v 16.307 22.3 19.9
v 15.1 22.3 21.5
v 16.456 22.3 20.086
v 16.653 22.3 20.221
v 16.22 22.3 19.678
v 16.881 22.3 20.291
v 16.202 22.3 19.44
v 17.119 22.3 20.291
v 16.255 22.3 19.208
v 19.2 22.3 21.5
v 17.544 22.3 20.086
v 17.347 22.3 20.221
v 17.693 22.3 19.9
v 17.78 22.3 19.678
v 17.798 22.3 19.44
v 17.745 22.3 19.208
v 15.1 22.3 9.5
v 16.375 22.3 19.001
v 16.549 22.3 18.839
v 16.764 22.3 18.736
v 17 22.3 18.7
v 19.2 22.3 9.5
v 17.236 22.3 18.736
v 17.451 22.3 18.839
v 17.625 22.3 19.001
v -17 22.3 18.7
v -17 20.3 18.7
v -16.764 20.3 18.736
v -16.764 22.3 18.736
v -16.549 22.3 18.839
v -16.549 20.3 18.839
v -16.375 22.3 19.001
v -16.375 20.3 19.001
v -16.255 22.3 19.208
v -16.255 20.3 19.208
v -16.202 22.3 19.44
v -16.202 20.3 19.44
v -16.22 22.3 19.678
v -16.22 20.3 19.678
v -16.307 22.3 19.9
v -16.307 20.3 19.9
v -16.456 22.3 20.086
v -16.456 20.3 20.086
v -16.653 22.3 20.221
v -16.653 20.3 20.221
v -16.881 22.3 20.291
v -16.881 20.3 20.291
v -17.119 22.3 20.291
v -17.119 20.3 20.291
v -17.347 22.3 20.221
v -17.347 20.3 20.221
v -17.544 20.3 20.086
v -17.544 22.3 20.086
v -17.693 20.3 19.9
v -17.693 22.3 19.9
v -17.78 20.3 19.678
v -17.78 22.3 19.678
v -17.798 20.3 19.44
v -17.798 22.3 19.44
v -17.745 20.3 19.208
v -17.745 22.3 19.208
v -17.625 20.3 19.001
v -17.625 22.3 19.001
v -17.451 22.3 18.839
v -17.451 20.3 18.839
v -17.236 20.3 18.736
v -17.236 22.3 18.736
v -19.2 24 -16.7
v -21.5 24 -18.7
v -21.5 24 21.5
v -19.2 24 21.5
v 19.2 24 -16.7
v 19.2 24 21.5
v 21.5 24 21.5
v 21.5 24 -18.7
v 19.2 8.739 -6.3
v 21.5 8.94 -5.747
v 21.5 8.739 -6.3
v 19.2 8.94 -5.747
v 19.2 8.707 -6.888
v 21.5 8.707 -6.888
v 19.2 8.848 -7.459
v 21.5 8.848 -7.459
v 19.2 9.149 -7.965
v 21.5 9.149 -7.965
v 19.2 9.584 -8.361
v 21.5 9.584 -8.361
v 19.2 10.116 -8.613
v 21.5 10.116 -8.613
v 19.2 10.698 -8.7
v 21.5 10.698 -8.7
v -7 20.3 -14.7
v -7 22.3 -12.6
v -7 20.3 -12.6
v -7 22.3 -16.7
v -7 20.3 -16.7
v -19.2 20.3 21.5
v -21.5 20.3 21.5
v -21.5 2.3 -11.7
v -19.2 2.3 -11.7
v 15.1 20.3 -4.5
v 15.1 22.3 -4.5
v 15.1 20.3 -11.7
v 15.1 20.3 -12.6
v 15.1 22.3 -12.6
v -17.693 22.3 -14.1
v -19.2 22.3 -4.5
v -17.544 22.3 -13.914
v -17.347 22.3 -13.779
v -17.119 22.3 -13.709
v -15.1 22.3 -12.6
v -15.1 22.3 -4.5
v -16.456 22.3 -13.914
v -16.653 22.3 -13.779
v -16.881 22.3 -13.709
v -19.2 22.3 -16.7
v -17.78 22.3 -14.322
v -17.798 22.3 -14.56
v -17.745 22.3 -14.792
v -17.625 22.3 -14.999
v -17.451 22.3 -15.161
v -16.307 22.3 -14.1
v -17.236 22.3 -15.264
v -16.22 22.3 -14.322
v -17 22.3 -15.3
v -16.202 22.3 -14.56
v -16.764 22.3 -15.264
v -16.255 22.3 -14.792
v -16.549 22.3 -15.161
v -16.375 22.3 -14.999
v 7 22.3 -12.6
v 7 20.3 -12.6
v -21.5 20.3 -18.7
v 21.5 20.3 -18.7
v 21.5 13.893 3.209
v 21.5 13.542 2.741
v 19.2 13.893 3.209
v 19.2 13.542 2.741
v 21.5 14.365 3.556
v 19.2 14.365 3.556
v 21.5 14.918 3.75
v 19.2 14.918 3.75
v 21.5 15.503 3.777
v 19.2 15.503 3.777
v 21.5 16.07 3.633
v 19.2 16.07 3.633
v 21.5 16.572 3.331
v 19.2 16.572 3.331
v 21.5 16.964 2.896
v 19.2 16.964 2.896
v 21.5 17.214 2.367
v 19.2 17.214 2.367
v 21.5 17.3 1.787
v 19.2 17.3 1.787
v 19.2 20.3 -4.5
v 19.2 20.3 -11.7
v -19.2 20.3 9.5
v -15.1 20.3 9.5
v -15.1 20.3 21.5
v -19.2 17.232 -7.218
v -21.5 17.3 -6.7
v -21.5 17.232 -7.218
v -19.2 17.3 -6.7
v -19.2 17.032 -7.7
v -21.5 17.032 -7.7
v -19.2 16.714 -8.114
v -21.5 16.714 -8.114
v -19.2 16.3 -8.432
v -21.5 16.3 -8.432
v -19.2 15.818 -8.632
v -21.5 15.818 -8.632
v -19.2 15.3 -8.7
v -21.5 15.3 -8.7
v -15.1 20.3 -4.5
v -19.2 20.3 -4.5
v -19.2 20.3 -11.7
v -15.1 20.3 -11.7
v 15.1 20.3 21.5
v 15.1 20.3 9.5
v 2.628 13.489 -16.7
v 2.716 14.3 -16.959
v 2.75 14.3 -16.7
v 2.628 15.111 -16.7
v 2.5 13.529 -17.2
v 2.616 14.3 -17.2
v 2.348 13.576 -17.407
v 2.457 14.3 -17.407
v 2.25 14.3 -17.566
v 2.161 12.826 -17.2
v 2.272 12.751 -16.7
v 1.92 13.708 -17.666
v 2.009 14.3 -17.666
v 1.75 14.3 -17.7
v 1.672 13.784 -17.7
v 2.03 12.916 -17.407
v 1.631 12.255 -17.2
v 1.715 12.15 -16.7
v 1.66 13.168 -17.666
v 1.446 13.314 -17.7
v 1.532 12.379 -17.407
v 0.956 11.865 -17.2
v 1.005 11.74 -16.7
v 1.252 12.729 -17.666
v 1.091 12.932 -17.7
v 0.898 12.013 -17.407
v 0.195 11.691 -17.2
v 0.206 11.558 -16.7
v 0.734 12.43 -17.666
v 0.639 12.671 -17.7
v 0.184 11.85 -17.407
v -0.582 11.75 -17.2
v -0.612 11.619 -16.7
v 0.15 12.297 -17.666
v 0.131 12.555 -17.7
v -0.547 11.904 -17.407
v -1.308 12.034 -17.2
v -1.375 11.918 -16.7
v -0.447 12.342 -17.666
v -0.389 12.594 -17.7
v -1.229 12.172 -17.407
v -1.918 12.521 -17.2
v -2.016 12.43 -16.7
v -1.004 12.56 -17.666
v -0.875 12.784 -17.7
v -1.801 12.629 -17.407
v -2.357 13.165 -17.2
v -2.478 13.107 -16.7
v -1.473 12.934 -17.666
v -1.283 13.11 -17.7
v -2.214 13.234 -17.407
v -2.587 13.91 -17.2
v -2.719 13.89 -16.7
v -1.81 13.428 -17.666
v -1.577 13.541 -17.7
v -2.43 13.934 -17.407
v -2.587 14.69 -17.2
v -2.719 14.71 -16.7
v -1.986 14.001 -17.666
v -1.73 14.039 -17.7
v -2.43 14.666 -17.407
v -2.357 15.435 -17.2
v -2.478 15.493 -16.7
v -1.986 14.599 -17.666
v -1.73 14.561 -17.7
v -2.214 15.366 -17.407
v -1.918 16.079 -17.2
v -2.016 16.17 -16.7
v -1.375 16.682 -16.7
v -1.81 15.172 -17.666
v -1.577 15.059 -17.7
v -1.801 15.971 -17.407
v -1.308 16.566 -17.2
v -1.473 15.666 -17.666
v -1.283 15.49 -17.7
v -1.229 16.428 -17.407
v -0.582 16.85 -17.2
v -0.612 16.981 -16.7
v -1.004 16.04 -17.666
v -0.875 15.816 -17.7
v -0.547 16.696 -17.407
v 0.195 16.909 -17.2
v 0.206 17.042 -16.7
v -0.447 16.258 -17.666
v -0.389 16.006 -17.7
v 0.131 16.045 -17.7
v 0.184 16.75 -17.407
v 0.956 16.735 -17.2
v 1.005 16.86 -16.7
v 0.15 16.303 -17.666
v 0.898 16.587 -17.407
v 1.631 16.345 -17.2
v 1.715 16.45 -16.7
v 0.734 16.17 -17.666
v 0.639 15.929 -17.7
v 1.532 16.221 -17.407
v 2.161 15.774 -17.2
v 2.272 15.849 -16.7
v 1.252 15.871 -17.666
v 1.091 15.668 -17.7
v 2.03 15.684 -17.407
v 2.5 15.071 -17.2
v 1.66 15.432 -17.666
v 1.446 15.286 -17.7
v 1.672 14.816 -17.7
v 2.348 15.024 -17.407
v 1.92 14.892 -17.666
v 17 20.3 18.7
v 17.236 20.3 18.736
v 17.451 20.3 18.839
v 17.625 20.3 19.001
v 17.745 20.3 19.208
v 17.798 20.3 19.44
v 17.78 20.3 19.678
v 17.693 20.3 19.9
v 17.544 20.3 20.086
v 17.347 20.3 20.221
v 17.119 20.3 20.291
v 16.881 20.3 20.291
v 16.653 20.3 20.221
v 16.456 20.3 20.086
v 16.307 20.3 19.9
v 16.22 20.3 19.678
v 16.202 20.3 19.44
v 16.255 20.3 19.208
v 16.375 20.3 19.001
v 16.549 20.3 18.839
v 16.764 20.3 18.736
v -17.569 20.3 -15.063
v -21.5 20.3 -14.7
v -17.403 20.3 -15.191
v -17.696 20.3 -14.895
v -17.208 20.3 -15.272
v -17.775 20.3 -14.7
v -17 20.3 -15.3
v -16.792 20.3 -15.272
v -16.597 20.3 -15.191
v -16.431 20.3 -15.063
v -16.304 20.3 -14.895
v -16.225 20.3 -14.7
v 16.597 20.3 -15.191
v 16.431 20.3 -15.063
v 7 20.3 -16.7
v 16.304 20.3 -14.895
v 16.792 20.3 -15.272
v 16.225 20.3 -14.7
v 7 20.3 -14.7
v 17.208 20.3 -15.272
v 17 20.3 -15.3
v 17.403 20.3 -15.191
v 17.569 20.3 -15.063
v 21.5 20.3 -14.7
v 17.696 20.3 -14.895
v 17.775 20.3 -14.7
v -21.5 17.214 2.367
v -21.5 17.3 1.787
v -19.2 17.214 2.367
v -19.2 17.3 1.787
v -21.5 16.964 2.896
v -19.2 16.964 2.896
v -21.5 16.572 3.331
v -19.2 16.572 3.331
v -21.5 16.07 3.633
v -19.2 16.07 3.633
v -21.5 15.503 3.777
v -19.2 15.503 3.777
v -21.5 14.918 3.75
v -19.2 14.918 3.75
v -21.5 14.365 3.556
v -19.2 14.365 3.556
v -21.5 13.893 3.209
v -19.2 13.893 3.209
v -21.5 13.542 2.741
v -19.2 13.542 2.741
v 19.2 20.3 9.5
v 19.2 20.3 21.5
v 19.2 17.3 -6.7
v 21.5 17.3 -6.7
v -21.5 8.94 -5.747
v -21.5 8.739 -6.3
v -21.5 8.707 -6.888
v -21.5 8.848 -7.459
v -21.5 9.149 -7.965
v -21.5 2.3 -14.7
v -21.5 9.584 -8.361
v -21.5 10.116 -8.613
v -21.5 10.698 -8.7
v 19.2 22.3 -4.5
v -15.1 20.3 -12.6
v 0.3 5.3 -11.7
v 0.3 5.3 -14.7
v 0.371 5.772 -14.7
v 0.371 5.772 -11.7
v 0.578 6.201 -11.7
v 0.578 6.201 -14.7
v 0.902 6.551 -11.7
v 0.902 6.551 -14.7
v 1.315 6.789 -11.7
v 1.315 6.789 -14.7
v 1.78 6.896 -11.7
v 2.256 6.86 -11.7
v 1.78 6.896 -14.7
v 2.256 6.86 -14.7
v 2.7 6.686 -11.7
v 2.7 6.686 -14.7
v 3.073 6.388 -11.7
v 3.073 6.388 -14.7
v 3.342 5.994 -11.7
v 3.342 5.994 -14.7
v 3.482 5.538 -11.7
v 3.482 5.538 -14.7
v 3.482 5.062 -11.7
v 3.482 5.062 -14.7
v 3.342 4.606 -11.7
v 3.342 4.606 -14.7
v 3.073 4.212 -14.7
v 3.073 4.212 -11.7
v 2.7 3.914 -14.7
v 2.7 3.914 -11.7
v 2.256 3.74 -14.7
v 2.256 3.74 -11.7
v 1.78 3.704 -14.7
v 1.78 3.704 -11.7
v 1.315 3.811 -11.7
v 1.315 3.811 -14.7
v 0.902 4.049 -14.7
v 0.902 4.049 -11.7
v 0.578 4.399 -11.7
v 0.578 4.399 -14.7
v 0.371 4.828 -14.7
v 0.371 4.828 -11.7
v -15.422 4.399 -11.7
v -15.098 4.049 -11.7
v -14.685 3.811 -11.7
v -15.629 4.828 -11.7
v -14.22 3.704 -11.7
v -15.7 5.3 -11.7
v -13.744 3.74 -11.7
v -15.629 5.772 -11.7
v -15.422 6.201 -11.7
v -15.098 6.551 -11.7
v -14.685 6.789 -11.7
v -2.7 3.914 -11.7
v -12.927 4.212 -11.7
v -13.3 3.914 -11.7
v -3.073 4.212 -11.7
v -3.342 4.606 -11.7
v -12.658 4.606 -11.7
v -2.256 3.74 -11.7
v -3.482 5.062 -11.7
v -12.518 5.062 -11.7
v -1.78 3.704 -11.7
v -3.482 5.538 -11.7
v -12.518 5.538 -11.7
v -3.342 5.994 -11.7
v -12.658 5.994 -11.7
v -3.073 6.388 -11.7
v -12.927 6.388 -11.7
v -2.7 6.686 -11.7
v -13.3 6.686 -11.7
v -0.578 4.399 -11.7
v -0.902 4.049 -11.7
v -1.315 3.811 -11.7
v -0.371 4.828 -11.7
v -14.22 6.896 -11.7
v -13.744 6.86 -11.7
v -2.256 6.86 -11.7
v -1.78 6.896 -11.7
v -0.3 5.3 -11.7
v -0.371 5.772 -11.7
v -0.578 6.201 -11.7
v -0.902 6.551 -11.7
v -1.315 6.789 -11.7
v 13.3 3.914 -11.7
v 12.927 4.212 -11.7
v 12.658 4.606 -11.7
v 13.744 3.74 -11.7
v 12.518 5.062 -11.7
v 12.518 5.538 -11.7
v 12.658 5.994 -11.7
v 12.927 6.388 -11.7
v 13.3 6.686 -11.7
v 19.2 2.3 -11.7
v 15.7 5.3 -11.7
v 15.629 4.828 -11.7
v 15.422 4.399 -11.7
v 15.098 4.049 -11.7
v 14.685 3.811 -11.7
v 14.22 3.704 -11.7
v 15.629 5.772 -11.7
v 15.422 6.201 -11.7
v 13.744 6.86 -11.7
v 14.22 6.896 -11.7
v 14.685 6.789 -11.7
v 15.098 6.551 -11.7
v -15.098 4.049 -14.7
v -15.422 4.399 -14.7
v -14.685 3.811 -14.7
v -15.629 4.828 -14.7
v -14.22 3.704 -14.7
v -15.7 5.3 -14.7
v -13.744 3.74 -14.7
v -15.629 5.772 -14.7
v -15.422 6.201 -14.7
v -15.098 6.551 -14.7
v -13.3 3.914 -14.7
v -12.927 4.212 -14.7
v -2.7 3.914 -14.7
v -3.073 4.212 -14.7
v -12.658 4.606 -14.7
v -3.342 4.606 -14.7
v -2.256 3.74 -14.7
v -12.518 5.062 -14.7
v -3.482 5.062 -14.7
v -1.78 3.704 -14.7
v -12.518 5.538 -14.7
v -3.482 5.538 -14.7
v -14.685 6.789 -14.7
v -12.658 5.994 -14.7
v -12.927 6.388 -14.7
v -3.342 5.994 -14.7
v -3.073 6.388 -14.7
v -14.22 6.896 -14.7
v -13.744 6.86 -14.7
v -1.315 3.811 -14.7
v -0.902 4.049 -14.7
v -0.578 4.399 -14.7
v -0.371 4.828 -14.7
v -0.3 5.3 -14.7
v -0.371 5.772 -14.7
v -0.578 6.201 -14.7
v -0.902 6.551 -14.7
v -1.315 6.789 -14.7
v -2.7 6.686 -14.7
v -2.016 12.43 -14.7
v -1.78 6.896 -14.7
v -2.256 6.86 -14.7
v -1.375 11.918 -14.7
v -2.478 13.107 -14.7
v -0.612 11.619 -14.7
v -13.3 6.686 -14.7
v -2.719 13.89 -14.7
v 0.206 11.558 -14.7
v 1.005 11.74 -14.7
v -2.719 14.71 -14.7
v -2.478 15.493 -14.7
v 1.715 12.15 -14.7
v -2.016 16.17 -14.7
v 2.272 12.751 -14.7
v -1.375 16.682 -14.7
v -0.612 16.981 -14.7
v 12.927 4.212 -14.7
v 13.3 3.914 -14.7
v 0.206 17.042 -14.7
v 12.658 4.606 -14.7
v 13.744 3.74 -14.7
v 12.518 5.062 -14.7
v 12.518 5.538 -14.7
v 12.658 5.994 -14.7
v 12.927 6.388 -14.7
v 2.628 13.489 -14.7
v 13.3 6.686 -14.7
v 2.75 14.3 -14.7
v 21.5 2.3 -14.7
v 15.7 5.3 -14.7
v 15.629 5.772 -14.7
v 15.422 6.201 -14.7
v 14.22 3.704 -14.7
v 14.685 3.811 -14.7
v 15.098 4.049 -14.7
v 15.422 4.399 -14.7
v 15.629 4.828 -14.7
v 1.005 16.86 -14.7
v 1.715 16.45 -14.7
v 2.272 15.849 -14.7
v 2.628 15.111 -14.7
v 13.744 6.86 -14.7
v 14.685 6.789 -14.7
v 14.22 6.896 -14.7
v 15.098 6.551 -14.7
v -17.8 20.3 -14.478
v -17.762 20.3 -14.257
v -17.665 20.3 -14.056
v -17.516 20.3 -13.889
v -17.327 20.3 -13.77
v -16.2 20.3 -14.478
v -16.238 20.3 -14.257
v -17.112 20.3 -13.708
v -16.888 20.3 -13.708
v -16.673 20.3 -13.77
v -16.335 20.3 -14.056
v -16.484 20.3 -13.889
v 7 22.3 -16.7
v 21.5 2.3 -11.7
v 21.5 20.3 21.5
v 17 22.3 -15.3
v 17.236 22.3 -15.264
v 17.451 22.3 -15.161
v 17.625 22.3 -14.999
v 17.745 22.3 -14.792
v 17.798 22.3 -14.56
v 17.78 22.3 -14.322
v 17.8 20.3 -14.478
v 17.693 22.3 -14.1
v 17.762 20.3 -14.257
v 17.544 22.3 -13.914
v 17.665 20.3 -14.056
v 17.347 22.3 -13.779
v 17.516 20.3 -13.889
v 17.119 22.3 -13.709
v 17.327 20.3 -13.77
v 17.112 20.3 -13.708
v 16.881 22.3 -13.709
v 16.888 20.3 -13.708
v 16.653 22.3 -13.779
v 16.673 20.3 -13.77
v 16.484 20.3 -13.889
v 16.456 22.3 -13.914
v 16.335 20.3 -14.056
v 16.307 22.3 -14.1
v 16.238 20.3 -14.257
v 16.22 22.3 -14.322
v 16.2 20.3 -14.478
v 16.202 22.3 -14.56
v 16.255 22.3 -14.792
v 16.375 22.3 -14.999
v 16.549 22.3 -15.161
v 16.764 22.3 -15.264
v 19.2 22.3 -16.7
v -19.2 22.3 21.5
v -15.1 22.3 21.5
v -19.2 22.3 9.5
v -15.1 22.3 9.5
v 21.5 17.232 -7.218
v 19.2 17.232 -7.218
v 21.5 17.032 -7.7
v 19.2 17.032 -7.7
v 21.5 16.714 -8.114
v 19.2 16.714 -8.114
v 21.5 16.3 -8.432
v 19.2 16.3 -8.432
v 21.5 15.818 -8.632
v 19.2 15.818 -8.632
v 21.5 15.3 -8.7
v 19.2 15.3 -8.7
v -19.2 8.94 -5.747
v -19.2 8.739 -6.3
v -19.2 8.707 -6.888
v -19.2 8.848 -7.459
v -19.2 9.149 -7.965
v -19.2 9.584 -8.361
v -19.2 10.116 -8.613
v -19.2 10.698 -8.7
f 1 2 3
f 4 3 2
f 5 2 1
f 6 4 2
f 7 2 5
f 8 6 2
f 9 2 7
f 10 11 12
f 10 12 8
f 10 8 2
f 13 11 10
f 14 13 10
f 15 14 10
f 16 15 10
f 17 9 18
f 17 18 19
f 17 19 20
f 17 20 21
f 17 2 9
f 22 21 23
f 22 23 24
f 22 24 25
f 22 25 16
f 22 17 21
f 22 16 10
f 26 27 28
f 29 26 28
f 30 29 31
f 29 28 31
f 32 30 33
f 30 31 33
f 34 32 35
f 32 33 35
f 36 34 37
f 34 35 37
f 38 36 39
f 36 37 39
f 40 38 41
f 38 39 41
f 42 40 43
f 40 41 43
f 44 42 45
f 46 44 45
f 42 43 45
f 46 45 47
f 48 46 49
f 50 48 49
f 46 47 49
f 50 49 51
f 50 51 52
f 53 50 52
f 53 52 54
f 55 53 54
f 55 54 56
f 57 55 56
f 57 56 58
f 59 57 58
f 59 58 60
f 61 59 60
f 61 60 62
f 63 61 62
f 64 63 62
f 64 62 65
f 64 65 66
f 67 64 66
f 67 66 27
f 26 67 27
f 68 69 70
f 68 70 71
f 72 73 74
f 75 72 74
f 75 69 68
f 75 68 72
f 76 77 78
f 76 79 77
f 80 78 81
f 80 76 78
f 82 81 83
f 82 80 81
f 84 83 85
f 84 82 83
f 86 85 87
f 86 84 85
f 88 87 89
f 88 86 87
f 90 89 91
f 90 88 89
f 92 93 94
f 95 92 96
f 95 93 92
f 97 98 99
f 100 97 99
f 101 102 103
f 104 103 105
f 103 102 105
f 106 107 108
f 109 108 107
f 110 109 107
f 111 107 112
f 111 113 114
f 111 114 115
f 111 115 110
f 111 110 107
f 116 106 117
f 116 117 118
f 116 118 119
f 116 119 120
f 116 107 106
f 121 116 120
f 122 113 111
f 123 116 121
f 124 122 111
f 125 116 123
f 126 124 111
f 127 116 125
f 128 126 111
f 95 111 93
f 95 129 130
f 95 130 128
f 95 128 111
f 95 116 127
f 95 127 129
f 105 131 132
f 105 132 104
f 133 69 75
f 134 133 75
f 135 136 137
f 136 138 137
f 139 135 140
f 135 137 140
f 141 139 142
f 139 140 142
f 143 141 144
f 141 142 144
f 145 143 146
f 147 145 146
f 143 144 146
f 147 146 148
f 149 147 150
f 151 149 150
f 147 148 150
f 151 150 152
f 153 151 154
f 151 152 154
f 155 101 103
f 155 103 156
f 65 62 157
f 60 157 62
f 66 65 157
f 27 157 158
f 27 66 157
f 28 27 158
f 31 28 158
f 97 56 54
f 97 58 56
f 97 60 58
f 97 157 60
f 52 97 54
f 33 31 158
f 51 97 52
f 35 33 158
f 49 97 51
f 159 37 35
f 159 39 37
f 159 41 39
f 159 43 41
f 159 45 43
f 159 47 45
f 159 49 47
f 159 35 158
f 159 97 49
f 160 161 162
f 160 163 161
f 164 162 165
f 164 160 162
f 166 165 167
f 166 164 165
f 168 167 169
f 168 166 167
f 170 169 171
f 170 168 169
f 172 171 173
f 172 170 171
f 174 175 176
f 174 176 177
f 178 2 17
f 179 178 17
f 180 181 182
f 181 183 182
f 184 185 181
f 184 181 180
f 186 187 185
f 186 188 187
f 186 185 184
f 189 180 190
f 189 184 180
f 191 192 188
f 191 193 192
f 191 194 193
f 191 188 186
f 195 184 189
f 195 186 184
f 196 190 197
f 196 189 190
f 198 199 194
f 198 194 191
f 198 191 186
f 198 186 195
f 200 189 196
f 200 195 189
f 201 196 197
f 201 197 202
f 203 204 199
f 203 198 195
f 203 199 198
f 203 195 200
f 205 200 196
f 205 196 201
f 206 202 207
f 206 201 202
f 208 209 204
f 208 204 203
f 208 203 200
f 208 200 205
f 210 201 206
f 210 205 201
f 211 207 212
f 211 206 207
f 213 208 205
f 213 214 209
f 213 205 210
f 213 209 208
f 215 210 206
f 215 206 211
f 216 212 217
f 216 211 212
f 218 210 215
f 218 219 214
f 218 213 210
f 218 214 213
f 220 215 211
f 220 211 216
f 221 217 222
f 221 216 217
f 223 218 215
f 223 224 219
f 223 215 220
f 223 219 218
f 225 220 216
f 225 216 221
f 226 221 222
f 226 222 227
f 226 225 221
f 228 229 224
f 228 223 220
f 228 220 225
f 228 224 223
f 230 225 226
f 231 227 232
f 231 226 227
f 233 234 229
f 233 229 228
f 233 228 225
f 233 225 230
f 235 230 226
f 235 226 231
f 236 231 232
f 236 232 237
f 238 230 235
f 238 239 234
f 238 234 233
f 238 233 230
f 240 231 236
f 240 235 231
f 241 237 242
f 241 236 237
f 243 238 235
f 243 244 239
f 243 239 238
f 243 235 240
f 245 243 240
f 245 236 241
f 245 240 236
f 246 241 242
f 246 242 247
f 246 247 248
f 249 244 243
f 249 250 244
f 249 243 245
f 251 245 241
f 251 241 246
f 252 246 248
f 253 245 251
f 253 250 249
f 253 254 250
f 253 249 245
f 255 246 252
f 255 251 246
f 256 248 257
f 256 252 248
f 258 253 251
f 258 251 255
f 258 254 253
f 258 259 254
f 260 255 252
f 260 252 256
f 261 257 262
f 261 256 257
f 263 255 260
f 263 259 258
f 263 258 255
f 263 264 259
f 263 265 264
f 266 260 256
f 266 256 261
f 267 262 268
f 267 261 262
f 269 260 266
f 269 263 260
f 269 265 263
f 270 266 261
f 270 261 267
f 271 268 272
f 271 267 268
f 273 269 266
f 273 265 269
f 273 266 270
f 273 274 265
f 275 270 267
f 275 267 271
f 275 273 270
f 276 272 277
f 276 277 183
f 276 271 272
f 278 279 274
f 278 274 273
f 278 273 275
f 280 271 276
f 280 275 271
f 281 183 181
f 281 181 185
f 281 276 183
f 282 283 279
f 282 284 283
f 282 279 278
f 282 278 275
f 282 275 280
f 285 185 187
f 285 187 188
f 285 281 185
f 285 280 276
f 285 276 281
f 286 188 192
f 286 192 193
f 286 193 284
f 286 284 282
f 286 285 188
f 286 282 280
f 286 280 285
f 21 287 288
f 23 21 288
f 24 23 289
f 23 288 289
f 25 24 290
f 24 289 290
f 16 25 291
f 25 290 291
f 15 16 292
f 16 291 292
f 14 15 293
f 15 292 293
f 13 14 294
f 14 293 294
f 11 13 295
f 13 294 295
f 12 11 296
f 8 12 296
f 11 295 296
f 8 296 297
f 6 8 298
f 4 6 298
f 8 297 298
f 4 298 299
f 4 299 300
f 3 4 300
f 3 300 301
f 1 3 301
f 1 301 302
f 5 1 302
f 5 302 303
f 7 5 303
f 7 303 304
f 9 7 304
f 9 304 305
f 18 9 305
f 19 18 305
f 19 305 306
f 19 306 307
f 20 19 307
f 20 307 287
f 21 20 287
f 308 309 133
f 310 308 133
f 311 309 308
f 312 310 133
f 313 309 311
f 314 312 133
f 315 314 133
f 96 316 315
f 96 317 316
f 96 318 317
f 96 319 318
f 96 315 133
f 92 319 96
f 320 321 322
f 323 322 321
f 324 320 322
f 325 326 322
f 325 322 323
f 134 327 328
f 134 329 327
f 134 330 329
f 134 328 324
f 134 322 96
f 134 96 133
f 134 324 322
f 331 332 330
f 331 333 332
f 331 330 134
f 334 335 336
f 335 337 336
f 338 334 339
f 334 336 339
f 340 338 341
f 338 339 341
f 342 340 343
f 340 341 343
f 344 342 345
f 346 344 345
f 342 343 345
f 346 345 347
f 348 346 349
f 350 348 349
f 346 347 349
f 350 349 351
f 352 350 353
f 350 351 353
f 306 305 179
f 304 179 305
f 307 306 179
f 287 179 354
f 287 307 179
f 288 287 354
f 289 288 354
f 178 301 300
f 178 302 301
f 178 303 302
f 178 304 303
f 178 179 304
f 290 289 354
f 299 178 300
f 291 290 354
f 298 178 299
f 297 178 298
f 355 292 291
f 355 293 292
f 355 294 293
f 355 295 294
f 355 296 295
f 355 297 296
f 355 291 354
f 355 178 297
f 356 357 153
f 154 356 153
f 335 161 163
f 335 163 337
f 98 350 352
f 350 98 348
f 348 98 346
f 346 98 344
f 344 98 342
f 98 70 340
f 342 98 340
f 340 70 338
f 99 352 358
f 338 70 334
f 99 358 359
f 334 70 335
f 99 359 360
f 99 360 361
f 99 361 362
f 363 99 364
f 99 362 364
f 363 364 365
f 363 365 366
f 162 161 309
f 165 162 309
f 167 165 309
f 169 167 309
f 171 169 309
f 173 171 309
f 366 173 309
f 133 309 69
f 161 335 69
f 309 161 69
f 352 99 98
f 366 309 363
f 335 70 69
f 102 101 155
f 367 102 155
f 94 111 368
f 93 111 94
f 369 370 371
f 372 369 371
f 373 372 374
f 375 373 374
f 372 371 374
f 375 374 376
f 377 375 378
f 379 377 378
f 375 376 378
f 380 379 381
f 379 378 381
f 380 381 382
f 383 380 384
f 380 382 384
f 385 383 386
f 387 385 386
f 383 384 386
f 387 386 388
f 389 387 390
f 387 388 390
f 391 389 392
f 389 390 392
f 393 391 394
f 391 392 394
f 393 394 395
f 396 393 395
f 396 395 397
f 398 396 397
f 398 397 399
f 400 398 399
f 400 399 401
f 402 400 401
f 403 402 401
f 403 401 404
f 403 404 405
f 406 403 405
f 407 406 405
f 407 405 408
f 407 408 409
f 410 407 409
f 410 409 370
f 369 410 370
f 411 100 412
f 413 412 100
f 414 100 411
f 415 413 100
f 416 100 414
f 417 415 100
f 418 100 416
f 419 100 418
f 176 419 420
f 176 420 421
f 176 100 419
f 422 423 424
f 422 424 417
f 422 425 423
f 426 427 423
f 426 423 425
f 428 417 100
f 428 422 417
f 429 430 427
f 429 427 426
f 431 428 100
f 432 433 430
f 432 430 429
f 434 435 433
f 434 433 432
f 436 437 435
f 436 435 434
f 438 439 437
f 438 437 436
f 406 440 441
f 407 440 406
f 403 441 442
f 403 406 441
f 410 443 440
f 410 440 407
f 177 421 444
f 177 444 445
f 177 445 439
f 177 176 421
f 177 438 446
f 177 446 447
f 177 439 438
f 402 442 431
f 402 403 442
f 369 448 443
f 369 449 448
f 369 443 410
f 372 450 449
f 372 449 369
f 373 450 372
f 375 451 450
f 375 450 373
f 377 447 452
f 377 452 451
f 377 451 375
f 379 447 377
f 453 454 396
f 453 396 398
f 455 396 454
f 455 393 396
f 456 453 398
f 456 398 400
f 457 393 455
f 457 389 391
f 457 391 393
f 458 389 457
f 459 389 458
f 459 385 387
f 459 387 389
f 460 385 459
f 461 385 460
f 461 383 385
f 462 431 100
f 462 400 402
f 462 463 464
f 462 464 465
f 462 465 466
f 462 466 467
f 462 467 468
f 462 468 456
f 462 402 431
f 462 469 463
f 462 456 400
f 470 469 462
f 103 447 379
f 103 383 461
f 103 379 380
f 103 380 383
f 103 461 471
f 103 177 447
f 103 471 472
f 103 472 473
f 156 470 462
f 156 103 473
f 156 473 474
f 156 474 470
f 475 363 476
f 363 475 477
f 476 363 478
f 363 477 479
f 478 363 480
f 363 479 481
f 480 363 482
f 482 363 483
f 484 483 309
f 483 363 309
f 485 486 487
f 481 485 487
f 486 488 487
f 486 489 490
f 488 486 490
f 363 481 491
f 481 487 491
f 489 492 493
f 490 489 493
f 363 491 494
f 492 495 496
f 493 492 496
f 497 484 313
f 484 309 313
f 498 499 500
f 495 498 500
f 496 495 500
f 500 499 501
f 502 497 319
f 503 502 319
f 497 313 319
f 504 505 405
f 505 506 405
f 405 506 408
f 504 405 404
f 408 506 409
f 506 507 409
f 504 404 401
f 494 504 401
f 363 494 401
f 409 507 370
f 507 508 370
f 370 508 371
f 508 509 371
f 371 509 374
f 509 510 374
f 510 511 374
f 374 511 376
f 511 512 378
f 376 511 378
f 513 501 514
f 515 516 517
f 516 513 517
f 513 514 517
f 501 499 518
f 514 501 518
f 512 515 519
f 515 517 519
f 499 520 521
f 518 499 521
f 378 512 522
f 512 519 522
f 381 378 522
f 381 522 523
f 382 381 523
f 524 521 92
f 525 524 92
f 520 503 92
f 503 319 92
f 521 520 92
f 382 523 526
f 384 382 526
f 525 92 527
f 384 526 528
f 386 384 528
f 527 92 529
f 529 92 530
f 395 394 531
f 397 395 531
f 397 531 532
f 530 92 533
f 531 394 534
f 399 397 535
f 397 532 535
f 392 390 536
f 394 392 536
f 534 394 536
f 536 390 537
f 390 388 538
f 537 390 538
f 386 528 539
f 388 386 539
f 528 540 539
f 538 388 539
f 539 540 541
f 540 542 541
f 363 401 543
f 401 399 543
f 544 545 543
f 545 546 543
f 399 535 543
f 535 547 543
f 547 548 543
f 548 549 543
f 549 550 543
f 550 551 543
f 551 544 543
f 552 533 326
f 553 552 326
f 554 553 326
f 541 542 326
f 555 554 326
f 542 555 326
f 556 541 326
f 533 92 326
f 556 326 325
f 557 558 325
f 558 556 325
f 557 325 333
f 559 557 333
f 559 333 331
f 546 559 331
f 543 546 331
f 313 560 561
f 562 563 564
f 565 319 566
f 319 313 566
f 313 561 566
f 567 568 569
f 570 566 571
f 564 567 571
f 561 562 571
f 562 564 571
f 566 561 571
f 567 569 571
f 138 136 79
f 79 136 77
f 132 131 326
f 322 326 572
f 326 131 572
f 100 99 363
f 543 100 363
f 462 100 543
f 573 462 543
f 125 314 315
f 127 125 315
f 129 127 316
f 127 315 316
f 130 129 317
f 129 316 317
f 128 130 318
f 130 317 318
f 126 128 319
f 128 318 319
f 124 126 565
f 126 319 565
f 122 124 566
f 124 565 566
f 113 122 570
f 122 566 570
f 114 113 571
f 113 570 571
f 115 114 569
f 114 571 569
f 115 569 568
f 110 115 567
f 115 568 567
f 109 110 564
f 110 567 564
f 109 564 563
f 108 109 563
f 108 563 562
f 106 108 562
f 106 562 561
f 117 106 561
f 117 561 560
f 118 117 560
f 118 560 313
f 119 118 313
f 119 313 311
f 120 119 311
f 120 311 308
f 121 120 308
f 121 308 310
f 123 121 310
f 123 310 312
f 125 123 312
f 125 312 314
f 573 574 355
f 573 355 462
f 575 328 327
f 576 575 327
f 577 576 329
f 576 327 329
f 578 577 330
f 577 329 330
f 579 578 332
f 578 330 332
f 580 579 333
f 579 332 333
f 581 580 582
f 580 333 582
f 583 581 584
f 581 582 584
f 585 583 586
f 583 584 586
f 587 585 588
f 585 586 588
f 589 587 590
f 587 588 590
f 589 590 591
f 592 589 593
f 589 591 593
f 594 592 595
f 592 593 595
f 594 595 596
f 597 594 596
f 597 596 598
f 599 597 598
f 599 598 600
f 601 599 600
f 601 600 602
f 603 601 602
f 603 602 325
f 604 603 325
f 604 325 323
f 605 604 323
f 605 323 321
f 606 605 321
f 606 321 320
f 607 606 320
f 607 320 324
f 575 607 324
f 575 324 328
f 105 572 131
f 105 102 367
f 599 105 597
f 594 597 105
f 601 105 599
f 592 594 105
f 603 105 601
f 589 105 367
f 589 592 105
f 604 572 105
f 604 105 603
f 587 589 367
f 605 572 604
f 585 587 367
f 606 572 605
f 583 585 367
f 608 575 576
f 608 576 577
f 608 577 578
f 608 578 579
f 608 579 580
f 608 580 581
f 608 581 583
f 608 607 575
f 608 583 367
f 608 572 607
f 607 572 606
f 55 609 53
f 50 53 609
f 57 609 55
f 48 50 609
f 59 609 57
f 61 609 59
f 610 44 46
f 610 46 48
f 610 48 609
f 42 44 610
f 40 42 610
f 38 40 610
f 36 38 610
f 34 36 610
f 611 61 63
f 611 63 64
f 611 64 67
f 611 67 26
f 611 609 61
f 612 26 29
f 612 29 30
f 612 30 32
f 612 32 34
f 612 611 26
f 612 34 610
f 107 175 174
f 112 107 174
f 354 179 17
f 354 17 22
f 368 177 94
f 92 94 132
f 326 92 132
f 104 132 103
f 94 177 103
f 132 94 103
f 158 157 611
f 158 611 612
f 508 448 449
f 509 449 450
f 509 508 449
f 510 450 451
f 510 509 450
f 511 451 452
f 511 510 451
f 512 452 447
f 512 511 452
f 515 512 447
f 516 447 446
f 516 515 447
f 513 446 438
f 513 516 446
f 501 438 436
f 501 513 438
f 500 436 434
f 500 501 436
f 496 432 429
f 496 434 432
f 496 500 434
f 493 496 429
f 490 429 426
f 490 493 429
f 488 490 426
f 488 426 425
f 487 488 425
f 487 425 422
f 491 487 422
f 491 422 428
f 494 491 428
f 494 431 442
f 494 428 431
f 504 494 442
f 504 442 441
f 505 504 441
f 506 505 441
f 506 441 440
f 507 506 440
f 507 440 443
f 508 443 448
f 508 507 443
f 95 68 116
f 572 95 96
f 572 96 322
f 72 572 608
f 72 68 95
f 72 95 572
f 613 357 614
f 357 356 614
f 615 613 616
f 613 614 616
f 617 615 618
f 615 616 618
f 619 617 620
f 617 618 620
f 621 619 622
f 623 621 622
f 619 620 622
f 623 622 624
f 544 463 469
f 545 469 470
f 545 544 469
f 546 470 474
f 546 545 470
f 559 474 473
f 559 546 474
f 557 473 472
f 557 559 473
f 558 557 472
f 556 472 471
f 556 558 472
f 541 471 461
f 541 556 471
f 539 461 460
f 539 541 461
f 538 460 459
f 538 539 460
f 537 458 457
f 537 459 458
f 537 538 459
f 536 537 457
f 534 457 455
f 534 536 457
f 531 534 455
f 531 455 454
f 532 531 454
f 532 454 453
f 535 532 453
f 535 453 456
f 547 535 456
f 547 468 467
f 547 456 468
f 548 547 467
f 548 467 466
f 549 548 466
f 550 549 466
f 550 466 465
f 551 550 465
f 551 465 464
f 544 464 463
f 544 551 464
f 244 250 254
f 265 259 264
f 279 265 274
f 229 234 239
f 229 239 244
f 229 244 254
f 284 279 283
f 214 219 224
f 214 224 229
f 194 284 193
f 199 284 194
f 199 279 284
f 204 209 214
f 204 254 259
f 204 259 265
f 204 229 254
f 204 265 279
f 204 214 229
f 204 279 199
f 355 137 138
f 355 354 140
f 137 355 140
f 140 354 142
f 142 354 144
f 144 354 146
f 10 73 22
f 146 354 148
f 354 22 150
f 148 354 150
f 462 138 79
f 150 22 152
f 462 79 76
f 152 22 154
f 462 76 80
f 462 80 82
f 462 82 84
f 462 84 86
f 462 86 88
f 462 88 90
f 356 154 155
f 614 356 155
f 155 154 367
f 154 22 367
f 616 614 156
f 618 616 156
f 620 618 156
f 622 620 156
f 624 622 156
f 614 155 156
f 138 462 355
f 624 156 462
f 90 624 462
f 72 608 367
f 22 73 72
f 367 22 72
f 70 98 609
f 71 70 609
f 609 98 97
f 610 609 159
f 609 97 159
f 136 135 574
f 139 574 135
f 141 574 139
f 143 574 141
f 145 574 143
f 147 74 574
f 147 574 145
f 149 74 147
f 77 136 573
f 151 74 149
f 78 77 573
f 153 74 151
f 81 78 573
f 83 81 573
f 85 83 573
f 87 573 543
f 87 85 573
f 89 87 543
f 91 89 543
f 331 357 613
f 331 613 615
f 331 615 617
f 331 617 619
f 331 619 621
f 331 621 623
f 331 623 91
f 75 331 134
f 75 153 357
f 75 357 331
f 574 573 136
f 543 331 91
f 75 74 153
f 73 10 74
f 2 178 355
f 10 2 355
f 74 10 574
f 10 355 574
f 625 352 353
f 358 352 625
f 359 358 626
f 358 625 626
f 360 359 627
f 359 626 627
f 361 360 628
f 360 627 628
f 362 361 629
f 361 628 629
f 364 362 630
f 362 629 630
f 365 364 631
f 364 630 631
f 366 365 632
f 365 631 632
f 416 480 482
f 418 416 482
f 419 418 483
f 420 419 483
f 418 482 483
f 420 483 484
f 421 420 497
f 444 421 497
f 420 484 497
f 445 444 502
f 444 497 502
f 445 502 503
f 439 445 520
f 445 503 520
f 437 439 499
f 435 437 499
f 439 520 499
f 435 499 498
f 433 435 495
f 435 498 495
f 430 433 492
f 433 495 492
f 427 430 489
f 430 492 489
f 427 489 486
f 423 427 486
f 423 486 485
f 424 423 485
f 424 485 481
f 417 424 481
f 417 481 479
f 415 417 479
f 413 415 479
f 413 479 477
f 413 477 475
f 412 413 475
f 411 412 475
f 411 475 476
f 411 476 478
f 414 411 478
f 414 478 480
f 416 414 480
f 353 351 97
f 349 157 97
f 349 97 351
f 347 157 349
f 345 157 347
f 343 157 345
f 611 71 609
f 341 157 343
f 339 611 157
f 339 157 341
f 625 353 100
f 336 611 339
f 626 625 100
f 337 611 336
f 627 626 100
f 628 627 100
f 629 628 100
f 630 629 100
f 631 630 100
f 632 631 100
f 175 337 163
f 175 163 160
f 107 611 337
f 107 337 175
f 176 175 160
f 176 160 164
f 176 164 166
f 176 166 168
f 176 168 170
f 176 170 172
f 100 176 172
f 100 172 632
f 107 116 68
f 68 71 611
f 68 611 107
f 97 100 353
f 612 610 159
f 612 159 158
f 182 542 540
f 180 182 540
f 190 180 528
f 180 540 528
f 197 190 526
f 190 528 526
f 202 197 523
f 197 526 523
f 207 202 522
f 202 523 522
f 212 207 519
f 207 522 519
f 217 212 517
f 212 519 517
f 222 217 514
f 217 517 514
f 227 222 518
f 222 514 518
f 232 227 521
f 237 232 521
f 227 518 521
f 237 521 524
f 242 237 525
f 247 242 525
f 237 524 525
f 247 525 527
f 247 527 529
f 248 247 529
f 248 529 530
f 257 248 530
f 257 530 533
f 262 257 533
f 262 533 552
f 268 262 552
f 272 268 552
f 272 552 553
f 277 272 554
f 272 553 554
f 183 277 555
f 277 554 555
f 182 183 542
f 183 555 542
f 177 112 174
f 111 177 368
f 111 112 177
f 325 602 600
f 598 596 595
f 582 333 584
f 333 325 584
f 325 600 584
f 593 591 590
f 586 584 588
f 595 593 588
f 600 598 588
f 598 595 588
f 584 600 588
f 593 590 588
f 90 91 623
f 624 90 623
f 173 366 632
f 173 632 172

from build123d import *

# Parameters (mm, degrees)
SKETCH1_W                  = 43
SKETCH1_H                  = 43
BOSS_EXTRUDE1_DEPTH        = 24
SKETCH2_W                  = 38.4
SKETCH2_H                  = 38.2
CUT_EXTRUDE1_DEPTH         = 1.7
F_1_6_1_6_DIAMETER_HOLE1_D = 1.6
SKETCH5_W                  = 30.2
SKETCH5_H                  = 34.1
CUT_EXTRUDE2_DEPTH         = 2
SKETCH6_W                  = 14
SKETCH6_H                  = 12
CUT_EXTRUDE3_DEPTH         = 38.706630717
SKETCH7_W                  = 28.9
SKETCH7_H                  = 55.98263728
CUT_EXTRUDE4_DEPTH         = 37.559403715
SKETCH8_W                  = 7.05
SKETCH8_H                  = 20.3
BOSS_EXTRUDE2_DEPTH        = 8.2
SKETCH9_W                  = 36.19131864
SKETCH9_H                  = 11.8
CUT_EXTRUDE5_DEPTH         = 4.1
F_2_9_2_9_DIAMETER_HOLE1_D = 2.9
SKETCH13_W                 = 45
SKETCH13_H                 = 30.01736272
CUT_EXTRUDE6_DEPTH         = 11.8
SKETCH_1_W                 = 54.379926199
SKETCH_1_H                 = 25.742878229
CUT_EXTRUDE_1_DEPTH        = 61.495371724
SKETCH_2_W                 = 51.169507394
SKETCH_2_H                 = 8.248398276
CUT_EXTRUDE_4_DEPTH        = 10
SKETCH_3_W                 = 38.4
SKETCH_3_H                 = 14
CUT_EXTRUDE_5_DEPTH        = 31.629887365
SKETCH_4_W                 = 43
SKETCH_4_H                 = 3
EXTRUDE_1_DEPTH            = 18
SKETCH_5_R                 = 1.6
CUT_EXTRUDE_6_DEPTH        = 49.463285072
SKETCH_5_4_R               = 2.75
EXTRUDE_2_DEPTH            = 3
FILLET_1_R                 = 1
EXTRUDE_3_DEPTH            = 2.3
EXTRUDE_4_DEPTH            = 2.3
FILLET_2_R                 = 2


with BuildPart() as part:
    # Sketch1 → Boss-Extrude1 (new body)
    with BuildSketch(Plane(origin=(0, 0, 0), x_dir=(1, 0, 0), z_dir=(0, 1, 0))):
        Rectangle(SKETCH1_W, SKETCH1_H)
    extrude(amount=BOSS_EXTRUDE1_DEPTH)

    # Sketch2 → Cut-Extrude1 (cut)
    with BuildSketch(Plane(origin=(0, 24, 0), x_dir=(1, 0, 0), z_dir=(0, 1, 0))):
        with Locations((0, -2.4)):
            Rectangle(SKETCH2_W, SKETCH2_H)
    extrude(amount=-CUT_EXTRUDE1_DEPTH, mode=Mode.SUBTRACT)

    # Ø1.6 (1.6) Diameter Hole1 (through all)
    with Locations(Plane(origin=(-17, 22.3, -14.5), x_dir=(0, 0, 1), z_dir=(0, 1, 0))):
        with Locations((0, 0), (0, 34), (34, 34), (34, 0)):
            Hole(F_1_6_1_6_DIAMETER_HOLE1_D / 2)

    # Sketch5 → Cut-Extrude2 (cut)
    with BuildSketch(Plane(origin=(0, 22.3, 0), x_dir=(1, 0, 0), z_dir=(0, 1, 0))):
        with Locations((0, -4.45)):
            Rectangle(SKETCH5_W, SKETCH5_H)
    extrude(amount=-CUT_EXTRUDE2_DEPTH, mode=Mode.SUBTRACT)

    # Sketch6 → Cut-Extrude3 (cut, through all)
    with BuildSketch(Plane(origin=(0, 22.3, 0), x_dir=(1, 0, 0), z_dir=(0, 1, 0))):
        with Locations((0, 10.7)):
            Rectangle(SKETCH6_W, SKETCH6_H)
    extrude(amount=-CUT_EXTRUDE3_DEPTH, mode=Mode.SUBTRACT)

    # Sketch7 → Cut-Extrude4 (cut, through all)
    with BuildSketch(Plane(origin=(0, 20.3, 0), x_dir=(1, 0, 0), z_dir=(0, 1, 0))):
        with Locations((0, -21.5)):
            Rectangle(SKETCH7_W, SKETCH7_H)
    extrude(amount=-CUT_EXTRUDE4_DEPTH, mode=Mode.SUBTRACT)

    # Sketch8 → Boss-Extrude2 (add)
    with BuildSketch(Plane.XY.offset(21.5)):
        with Locations((-17.975, 10.15)):
            Rectangle(SKETCH8_W, SKETCH8_H)
    boss_extrude2 = extrude(amount=BOSS_EXTRUDE2_DEPTH)

    # Mirror1: Boss-Extrude2 across plane
    add(boss_extrude2.mirror(Plane(origin=(0, 0, 0), x_dir=(0, 0, 1), z_dir=(1, 0, 0))))

    # Sketch9 → Cut-Extrude5 (cut)
    with BuildSketch(Plane(origin=(-14.45, 0, 0), x_dir=(0, 0, -1), z_dir=(1, 0, 0))):
        with Locations((-11.60434068, 5.9)):
            Rectangle(SKETCH9_W, SKETCH9_H)
    cut_extrude5 = extrude(amount=-CUT_EXTRUDE5_DEPTH, mode=Mode.SUBTRACT)

    # Mirror2: Cut-Extrude5 across plane
    add(cut_extrude5.mirror(Plane(origin=(0, 0, 0), x_dir=(0, 0, 1), z_dir=(1, 0, 0))), mode=Mode.SUBTRACT)

    # Ø2.9 (2.9) Diameter Hole1 (through all)
    with Locations(Plane.ZY.offset(21.5)):
        with Locations((6.7, 5.05), (18.7, 5.05)):
            Hole(F_2_9_2_9_DIAMETER_HOLE1_D / 2)

    # Sketch13 → Cut-Extrude6 (cut)
    with BuildSketch(Plane.XZ):
        with Locations((0, -21.5)):
            Rectangle(SKETCH13_W, SKETCH13_H)
    extrude(amount=-CUT_EXTRUDE6_DEPTH, mode=Mode.SUBTRACT)

    # 草图1 → 切除-拉伸1 (cut, through all)
    with BuildSketch(Plane.XY.offset(29.7)):
        with Locations((-0.875867159, 7.428560885)):
            Rectangle(SKETCH_1_W, SKETCH_1_H)
    extrude(amount=-CUT_EXTRUDE_1_DEPTH, mode=Mode.SUBTRACT)

    # 草图2 → 切除-拉伸4 (cut)
    with BuildSketch(Plane(origin=(0, 24, 0), x_dir=(1, 0, 0), z_dir=(0, 1, 0))):
        with Locations((1.669275501, 22.824199138)):
            Rectangle(SKETCH_2_W, SKETCH_2_H)
    extrude(amount=-CUT_EXTRUDE_4_DEPTH, mode=Mode.SUBTRACT)

    # 草图3 → 切除-拉伸5 (cut, through all)
    with BuildSketch(Plane.XZ.offset(-20.3)):
        with Locations((0, 2.5)):
            Rectangle(SKETCH_3_W, SKETCH_3_H)
    extrude(amount=-CUT_EXTRUDE_5_DEPTH, mode=Mode.SUBTRACT)

    # 草图4 → 凸台-拉伸1 (add)
    with BuildSketch(Plane.XZ.offset(-20.3)):
        with Locations((0, -13.2)):
            Rectangle(SKETCH_4_W, SKETCH_4_H)
    extrude(amount=EXTRUDE_1_DEPTH)

    # 草图5 → 切除-拉伸6 (cut, through all)
    with BuildSketch(Plane(origin=(0, 0, -14.7), x_dir=(-1, 0, 0), z_dir=(0, 0, -1))):
        with Locations((-1.9, 5.3)):
            Circle(SKETCH_5_R)
        with Locations((14.1, 5.3)):
            Circle(SKETCH_5_R)
    cut_extrude_6 = extrude(amount=-CUT_EXTRUDE_6_DEPTH, mode=Mode.SUBTRACT)

    # 草图5<4> → 凸台-拉伸2 (add)
    with BuildSketch(Plane(origin=(0, 0, -14.7), x_dir=(-1, 0, 0), z_dir=(0, 0, -1))):
        with Locations(Location((0, 14.3, 0), (0, 0, 180))):
            Circle(SKETCH_5_4_R)
    extrude(amount=EXTRUDE_2_DEPTH)

    # 圆角1
    fillet_1_edges = [part.edges().sort_by_distance(p)[0] for p in [
        (-2.75, 14.3, -17.7),
    ]]
    fillet(fillet_1_edges, radius=FILLET_1_R)

    # 草图6 → 凸台-拉伸3 (add)
    with BuildSketch(Plane(origin=(21.5, 0, 0), x_dir=(0, 0, -1), z_dir=(1, 0, 0))):
        Polygon((-21.5, 20.3), (11.7, 2.3), (11.7, 20.3), align=None)
        Polygon((-9.672401199, 17.3), (8.7, 7.339059591), (8.7, 17.3), align=None, mode=Mode.SUBTRACT)
    extrude(amount=-EXTRUDE_3_DEPTH)

    # 镜向1: 切除-拉伸6 across plane
    add(cut_extrude_6.mirror(Plane(origin=(0, 0, 0), x_dir=(0, 0, 1), z_dir=(1, 0, 0))), mode=Mode.SUBTRACT)

    # 草图7 → 凸台-拉伸4 (add)
    with BuildSketch(Plane.ZY.offset(21.5)):
        Polygon((-11.7, 2.3), (-11.7, 20.3), (21.5, 20.3), align=None)
        Polygon((-8.7, 17.3), (9.672401199, 17.3), (-8.7, 7.339059591), align=None, mode=Mode.SUBTRACT)
    extrude(amount=-EXTRUDE_4_DEPTH)

    # 圆角2
    fillet_2_edges = [part.edges().sort_by_distance(p)[0] for p in [
        (20.35, 17.3, 9.672401199),
        (20.35, 7.339059591, -8.7),
        (20.35, 17.3, -8.7),
        (-20.35, 7.339059591, -8.7),
        (-20.35, 17.3, 9.672401199),
        (-20.35, 17.3, -8.7),
    ]]
    fillet(fillet_2_edges, radius=FILLET_2_R)


solid = part.part
